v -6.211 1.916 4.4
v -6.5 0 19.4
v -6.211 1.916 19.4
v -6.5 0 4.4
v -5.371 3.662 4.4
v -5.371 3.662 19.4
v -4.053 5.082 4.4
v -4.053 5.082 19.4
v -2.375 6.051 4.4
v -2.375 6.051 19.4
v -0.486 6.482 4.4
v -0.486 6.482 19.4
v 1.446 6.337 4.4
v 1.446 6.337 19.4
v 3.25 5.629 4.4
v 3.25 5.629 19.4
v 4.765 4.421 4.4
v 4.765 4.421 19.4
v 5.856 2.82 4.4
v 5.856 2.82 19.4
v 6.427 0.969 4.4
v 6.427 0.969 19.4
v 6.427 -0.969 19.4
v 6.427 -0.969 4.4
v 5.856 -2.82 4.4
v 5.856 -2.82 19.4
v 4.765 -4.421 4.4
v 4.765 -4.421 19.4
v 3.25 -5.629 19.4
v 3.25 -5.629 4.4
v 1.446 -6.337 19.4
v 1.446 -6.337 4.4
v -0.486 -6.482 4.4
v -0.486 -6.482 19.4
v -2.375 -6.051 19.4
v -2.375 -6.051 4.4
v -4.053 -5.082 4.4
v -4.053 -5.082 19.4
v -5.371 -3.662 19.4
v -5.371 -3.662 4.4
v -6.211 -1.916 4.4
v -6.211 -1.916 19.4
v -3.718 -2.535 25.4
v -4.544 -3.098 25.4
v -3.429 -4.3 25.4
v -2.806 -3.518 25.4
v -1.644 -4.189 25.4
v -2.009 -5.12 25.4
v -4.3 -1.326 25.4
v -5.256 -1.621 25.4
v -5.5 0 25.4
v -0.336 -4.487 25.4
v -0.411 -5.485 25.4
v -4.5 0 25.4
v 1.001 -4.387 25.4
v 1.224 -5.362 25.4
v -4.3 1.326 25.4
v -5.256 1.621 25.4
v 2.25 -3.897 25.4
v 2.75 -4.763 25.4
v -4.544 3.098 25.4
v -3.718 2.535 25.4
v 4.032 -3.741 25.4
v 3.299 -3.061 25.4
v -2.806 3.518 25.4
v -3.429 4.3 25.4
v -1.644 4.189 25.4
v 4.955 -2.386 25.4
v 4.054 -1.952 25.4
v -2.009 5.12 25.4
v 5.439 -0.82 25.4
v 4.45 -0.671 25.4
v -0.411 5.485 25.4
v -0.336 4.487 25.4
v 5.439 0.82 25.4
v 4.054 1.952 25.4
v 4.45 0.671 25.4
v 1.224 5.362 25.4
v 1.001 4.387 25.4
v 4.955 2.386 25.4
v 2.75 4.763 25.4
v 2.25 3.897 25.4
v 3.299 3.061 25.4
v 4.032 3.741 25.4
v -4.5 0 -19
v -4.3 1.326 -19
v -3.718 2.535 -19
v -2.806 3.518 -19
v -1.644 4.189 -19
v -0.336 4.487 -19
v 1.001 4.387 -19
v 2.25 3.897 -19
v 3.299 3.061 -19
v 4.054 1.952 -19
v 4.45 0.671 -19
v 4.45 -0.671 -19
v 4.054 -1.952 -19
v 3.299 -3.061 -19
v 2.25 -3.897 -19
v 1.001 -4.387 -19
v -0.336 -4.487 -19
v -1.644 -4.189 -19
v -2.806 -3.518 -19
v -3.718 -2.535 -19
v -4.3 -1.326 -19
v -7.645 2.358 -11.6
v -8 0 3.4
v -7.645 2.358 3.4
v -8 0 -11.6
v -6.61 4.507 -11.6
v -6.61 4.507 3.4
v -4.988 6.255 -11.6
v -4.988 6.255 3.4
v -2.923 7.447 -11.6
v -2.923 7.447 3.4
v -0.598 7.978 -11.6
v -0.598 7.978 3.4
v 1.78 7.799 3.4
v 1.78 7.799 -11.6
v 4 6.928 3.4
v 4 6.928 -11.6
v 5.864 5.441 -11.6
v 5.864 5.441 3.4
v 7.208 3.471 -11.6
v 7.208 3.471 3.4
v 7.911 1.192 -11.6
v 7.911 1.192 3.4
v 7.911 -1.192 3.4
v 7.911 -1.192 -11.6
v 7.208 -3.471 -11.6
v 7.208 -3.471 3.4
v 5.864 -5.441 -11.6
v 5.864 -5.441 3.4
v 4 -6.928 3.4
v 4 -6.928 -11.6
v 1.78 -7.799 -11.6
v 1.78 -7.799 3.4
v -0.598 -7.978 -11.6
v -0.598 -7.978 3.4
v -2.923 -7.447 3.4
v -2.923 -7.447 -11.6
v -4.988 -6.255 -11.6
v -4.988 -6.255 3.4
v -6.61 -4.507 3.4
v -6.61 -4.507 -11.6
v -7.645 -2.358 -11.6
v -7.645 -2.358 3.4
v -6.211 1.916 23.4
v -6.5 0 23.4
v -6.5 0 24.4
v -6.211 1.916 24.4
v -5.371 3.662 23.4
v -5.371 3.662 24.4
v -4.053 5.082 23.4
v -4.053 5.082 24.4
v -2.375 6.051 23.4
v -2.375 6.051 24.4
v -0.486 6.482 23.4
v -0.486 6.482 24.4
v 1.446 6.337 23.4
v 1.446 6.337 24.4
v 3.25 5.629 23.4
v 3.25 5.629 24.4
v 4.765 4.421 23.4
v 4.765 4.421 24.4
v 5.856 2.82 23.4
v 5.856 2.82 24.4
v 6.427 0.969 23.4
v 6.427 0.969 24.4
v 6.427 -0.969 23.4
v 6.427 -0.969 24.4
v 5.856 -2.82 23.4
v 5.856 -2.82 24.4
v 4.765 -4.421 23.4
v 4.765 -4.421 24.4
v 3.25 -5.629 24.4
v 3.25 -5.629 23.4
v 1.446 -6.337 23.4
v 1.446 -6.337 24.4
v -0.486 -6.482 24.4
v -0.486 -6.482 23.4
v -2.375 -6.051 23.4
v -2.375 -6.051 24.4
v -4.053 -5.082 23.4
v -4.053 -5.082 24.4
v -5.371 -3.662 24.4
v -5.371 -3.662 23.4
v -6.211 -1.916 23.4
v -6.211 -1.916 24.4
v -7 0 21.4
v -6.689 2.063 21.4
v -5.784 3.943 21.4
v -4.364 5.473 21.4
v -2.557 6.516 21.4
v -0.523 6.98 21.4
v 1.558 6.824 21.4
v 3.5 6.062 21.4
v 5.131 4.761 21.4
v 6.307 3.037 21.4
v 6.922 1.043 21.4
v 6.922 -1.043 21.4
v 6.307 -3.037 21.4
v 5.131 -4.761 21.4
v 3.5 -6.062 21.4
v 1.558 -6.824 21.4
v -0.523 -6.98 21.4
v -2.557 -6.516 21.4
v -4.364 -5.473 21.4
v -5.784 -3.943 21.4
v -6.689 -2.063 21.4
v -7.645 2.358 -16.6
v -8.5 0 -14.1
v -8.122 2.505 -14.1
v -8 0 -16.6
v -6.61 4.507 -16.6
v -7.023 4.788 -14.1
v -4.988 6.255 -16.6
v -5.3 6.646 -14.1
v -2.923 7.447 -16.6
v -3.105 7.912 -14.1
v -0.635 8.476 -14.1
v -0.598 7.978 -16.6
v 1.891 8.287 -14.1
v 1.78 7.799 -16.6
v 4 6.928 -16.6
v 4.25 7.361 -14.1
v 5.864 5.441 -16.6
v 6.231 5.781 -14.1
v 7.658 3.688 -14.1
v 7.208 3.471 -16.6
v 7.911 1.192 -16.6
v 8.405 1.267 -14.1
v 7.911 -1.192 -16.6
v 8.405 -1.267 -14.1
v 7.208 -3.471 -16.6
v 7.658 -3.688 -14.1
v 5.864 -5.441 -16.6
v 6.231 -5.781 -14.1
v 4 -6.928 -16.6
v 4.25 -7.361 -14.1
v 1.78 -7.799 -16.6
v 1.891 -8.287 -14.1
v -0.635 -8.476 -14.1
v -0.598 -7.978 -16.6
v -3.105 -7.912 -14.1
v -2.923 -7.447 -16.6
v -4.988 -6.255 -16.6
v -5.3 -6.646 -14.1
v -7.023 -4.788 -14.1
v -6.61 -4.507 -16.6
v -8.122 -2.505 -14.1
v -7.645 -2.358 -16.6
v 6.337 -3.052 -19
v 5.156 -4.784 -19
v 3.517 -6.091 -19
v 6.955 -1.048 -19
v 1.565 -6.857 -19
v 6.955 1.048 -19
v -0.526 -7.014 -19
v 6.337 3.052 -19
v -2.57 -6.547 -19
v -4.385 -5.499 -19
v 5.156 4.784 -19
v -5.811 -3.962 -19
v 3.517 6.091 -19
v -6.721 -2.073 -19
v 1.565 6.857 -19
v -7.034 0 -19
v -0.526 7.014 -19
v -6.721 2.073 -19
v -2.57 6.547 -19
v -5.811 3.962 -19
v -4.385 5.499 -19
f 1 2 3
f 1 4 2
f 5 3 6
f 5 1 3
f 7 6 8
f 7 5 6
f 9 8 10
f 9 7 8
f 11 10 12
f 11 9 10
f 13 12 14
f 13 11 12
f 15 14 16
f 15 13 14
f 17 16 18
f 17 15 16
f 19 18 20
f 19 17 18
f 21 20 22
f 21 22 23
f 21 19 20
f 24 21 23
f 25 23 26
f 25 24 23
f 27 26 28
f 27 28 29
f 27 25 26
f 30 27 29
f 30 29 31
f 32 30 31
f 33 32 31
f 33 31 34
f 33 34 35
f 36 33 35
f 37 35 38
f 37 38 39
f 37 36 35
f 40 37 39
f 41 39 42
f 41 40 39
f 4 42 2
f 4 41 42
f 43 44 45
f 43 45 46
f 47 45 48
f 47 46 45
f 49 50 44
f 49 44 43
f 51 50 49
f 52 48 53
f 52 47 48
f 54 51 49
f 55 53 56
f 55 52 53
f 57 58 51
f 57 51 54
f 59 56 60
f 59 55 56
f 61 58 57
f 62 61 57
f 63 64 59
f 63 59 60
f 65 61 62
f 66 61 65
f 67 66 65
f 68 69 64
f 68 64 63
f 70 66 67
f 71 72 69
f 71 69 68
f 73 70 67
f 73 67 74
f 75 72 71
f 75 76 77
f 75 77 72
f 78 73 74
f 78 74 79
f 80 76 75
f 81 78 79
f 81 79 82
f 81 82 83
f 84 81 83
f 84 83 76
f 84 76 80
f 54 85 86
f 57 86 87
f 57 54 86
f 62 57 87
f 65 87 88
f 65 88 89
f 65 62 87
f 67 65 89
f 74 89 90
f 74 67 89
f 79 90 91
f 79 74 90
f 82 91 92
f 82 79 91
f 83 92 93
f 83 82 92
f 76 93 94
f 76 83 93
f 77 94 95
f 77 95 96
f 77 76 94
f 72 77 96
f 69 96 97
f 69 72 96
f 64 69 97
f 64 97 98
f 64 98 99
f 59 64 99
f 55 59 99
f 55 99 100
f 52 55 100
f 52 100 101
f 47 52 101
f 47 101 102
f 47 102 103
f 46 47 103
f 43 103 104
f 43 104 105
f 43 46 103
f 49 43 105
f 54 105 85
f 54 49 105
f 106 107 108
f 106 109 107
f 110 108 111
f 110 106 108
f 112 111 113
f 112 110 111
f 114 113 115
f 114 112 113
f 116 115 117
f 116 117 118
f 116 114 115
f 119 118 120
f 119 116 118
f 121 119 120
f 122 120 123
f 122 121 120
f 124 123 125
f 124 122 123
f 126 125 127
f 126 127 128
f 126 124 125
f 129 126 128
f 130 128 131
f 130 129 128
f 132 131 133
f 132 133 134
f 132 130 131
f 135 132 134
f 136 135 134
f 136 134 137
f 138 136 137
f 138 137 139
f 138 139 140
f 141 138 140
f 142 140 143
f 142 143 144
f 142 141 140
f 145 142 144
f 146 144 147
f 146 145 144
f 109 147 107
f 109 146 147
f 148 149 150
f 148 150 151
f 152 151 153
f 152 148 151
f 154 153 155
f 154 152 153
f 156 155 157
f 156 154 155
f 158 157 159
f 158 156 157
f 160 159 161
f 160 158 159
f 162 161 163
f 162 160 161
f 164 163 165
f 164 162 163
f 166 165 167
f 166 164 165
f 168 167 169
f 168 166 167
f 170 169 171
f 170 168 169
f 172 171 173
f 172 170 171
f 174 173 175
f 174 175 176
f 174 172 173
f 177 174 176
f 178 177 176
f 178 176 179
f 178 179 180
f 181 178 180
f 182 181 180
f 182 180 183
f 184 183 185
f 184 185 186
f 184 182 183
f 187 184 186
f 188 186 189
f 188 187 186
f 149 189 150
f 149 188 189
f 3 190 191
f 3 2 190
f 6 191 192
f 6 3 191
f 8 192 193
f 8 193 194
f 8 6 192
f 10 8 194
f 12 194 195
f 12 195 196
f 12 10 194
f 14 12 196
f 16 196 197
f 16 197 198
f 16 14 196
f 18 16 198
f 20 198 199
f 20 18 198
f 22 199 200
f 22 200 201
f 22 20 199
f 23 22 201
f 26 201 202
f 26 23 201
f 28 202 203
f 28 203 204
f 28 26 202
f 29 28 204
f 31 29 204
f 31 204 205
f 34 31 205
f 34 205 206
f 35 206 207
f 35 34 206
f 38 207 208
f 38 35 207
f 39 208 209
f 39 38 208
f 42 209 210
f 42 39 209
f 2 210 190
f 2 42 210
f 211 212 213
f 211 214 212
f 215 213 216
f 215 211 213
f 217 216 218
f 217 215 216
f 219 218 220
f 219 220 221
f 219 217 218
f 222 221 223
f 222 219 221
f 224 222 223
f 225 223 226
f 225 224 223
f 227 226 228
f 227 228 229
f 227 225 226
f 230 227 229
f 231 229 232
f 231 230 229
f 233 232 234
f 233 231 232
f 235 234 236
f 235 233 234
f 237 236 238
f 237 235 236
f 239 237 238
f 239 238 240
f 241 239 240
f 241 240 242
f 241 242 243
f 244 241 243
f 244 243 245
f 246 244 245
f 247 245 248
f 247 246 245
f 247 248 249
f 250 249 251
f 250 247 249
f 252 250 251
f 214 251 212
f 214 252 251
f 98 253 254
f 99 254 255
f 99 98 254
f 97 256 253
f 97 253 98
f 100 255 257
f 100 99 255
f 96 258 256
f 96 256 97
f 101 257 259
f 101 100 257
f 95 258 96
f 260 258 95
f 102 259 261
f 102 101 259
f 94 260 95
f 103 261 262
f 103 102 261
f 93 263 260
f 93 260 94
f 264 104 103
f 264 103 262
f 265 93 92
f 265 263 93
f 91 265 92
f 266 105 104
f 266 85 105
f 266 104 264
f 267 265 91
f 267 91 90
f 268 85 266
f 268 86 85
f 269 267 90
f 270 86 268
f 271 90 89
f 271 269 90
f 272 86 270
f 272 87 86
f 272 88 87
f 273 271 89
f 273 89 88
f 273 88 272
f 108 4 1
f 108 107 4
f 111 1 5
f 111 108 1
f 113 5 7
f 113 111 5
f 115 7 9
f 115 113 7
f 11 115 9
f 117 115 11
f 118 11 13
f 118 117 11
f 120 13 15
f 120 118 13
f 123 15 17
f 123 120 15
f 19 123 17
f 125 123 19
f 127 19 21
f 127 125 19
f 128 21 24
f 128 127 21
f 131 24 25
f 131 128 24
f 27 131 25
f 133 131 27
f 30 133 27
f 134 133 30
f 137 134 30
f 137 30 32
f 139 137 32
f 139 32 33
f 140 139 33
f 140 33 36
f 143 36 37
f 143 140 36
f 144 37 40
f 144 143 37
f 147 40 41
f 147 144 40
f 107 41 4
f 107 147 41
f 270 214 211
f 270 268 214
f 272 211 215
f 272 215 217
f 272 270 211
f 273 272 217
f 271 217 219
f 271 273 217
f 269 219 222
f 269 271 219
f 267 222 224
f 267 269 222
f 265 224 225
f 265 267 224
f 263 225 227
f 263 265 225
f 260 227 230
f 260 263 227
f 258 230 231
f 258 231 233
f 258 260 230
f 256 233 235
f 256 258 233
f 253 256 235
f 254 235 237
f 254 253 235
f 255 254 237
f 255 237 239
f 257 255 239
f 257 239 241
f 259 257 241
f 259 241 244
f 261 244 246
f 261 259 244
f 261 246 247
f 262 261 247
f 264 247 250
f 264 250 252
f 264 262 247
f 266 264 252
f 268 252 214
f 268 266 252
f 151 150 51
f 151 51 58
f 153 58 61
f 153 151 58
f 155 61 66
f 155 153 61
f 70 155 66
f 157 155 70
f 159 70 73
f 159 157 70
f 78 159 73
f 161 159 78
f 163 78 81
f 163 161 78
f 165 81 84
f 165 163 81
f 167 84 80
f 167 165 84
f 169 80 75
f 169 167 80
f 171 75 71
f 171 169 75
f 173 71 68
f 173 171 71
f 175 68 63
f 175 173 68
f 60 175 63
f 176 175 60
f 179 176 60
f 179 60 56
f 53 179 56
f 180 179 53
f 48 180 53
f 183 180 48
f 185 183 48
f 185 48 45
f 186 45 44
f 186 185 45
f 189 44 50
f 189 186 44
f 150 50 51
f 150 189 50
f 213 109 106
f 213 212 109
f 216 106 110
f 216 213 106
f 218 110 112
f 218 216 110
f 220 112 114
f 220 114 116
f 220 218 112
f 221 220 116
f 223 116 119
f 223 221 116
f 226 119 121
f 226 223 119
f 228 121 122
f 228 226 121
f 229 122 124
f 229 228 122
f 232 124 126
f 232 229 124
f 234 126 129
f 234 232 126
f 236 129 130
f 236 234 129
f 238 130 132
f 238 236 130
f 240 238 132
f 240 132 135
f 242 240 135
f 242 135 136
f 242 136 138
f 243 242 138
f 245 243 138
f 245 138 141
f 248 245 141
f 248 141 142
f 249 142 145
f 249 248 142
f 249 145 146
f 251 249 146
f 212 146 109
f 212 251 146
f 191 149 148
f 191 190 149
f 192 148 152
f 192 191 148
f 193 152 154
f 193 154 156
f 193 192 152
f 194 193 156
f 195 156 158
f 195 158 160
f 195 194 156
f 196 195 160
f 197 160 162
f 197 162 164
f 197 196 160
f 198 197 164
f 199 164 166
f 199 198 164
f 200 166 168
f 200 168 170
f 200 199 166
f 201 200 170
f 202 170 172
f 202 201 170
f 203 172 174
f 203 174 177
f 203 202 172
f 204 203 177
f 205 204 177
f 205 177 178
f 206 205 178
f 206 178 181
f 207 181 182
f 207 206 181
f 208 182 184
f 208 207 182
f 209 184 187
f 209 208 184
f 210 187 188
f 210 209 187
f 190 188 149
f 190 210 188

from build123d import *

# Parameters (mm, degrees)
F2_SIZE = 1


with BuildPart() as f1:
    # F0 (on Front) → F1 (revolve)
    with BuildSketch(Plane.XZ):
        Polygon((-4.5, -19), (-4.5, 25.4), (-6.5, 25.4), (-6.5, 23.4), (-7, 21.4), (-6.5, 19.4), (-6.5, 4.4), (-8, 3.4), (-8, -11.6), (-8.5, -14.1), (-8, -16.6), (-7.033584, -19), align=None)
    revolve(axis=Axis((0, 0, -3.23939), (0, 0, -1)))

    # F2
    f2_edges = [f1.edges().sort_by_distance(p)[0] for p in [
        (6.5, 0, 25.4),
    ]]
    chamfer(f2_edges, length=F2_SIZE)


solid = f1.part
